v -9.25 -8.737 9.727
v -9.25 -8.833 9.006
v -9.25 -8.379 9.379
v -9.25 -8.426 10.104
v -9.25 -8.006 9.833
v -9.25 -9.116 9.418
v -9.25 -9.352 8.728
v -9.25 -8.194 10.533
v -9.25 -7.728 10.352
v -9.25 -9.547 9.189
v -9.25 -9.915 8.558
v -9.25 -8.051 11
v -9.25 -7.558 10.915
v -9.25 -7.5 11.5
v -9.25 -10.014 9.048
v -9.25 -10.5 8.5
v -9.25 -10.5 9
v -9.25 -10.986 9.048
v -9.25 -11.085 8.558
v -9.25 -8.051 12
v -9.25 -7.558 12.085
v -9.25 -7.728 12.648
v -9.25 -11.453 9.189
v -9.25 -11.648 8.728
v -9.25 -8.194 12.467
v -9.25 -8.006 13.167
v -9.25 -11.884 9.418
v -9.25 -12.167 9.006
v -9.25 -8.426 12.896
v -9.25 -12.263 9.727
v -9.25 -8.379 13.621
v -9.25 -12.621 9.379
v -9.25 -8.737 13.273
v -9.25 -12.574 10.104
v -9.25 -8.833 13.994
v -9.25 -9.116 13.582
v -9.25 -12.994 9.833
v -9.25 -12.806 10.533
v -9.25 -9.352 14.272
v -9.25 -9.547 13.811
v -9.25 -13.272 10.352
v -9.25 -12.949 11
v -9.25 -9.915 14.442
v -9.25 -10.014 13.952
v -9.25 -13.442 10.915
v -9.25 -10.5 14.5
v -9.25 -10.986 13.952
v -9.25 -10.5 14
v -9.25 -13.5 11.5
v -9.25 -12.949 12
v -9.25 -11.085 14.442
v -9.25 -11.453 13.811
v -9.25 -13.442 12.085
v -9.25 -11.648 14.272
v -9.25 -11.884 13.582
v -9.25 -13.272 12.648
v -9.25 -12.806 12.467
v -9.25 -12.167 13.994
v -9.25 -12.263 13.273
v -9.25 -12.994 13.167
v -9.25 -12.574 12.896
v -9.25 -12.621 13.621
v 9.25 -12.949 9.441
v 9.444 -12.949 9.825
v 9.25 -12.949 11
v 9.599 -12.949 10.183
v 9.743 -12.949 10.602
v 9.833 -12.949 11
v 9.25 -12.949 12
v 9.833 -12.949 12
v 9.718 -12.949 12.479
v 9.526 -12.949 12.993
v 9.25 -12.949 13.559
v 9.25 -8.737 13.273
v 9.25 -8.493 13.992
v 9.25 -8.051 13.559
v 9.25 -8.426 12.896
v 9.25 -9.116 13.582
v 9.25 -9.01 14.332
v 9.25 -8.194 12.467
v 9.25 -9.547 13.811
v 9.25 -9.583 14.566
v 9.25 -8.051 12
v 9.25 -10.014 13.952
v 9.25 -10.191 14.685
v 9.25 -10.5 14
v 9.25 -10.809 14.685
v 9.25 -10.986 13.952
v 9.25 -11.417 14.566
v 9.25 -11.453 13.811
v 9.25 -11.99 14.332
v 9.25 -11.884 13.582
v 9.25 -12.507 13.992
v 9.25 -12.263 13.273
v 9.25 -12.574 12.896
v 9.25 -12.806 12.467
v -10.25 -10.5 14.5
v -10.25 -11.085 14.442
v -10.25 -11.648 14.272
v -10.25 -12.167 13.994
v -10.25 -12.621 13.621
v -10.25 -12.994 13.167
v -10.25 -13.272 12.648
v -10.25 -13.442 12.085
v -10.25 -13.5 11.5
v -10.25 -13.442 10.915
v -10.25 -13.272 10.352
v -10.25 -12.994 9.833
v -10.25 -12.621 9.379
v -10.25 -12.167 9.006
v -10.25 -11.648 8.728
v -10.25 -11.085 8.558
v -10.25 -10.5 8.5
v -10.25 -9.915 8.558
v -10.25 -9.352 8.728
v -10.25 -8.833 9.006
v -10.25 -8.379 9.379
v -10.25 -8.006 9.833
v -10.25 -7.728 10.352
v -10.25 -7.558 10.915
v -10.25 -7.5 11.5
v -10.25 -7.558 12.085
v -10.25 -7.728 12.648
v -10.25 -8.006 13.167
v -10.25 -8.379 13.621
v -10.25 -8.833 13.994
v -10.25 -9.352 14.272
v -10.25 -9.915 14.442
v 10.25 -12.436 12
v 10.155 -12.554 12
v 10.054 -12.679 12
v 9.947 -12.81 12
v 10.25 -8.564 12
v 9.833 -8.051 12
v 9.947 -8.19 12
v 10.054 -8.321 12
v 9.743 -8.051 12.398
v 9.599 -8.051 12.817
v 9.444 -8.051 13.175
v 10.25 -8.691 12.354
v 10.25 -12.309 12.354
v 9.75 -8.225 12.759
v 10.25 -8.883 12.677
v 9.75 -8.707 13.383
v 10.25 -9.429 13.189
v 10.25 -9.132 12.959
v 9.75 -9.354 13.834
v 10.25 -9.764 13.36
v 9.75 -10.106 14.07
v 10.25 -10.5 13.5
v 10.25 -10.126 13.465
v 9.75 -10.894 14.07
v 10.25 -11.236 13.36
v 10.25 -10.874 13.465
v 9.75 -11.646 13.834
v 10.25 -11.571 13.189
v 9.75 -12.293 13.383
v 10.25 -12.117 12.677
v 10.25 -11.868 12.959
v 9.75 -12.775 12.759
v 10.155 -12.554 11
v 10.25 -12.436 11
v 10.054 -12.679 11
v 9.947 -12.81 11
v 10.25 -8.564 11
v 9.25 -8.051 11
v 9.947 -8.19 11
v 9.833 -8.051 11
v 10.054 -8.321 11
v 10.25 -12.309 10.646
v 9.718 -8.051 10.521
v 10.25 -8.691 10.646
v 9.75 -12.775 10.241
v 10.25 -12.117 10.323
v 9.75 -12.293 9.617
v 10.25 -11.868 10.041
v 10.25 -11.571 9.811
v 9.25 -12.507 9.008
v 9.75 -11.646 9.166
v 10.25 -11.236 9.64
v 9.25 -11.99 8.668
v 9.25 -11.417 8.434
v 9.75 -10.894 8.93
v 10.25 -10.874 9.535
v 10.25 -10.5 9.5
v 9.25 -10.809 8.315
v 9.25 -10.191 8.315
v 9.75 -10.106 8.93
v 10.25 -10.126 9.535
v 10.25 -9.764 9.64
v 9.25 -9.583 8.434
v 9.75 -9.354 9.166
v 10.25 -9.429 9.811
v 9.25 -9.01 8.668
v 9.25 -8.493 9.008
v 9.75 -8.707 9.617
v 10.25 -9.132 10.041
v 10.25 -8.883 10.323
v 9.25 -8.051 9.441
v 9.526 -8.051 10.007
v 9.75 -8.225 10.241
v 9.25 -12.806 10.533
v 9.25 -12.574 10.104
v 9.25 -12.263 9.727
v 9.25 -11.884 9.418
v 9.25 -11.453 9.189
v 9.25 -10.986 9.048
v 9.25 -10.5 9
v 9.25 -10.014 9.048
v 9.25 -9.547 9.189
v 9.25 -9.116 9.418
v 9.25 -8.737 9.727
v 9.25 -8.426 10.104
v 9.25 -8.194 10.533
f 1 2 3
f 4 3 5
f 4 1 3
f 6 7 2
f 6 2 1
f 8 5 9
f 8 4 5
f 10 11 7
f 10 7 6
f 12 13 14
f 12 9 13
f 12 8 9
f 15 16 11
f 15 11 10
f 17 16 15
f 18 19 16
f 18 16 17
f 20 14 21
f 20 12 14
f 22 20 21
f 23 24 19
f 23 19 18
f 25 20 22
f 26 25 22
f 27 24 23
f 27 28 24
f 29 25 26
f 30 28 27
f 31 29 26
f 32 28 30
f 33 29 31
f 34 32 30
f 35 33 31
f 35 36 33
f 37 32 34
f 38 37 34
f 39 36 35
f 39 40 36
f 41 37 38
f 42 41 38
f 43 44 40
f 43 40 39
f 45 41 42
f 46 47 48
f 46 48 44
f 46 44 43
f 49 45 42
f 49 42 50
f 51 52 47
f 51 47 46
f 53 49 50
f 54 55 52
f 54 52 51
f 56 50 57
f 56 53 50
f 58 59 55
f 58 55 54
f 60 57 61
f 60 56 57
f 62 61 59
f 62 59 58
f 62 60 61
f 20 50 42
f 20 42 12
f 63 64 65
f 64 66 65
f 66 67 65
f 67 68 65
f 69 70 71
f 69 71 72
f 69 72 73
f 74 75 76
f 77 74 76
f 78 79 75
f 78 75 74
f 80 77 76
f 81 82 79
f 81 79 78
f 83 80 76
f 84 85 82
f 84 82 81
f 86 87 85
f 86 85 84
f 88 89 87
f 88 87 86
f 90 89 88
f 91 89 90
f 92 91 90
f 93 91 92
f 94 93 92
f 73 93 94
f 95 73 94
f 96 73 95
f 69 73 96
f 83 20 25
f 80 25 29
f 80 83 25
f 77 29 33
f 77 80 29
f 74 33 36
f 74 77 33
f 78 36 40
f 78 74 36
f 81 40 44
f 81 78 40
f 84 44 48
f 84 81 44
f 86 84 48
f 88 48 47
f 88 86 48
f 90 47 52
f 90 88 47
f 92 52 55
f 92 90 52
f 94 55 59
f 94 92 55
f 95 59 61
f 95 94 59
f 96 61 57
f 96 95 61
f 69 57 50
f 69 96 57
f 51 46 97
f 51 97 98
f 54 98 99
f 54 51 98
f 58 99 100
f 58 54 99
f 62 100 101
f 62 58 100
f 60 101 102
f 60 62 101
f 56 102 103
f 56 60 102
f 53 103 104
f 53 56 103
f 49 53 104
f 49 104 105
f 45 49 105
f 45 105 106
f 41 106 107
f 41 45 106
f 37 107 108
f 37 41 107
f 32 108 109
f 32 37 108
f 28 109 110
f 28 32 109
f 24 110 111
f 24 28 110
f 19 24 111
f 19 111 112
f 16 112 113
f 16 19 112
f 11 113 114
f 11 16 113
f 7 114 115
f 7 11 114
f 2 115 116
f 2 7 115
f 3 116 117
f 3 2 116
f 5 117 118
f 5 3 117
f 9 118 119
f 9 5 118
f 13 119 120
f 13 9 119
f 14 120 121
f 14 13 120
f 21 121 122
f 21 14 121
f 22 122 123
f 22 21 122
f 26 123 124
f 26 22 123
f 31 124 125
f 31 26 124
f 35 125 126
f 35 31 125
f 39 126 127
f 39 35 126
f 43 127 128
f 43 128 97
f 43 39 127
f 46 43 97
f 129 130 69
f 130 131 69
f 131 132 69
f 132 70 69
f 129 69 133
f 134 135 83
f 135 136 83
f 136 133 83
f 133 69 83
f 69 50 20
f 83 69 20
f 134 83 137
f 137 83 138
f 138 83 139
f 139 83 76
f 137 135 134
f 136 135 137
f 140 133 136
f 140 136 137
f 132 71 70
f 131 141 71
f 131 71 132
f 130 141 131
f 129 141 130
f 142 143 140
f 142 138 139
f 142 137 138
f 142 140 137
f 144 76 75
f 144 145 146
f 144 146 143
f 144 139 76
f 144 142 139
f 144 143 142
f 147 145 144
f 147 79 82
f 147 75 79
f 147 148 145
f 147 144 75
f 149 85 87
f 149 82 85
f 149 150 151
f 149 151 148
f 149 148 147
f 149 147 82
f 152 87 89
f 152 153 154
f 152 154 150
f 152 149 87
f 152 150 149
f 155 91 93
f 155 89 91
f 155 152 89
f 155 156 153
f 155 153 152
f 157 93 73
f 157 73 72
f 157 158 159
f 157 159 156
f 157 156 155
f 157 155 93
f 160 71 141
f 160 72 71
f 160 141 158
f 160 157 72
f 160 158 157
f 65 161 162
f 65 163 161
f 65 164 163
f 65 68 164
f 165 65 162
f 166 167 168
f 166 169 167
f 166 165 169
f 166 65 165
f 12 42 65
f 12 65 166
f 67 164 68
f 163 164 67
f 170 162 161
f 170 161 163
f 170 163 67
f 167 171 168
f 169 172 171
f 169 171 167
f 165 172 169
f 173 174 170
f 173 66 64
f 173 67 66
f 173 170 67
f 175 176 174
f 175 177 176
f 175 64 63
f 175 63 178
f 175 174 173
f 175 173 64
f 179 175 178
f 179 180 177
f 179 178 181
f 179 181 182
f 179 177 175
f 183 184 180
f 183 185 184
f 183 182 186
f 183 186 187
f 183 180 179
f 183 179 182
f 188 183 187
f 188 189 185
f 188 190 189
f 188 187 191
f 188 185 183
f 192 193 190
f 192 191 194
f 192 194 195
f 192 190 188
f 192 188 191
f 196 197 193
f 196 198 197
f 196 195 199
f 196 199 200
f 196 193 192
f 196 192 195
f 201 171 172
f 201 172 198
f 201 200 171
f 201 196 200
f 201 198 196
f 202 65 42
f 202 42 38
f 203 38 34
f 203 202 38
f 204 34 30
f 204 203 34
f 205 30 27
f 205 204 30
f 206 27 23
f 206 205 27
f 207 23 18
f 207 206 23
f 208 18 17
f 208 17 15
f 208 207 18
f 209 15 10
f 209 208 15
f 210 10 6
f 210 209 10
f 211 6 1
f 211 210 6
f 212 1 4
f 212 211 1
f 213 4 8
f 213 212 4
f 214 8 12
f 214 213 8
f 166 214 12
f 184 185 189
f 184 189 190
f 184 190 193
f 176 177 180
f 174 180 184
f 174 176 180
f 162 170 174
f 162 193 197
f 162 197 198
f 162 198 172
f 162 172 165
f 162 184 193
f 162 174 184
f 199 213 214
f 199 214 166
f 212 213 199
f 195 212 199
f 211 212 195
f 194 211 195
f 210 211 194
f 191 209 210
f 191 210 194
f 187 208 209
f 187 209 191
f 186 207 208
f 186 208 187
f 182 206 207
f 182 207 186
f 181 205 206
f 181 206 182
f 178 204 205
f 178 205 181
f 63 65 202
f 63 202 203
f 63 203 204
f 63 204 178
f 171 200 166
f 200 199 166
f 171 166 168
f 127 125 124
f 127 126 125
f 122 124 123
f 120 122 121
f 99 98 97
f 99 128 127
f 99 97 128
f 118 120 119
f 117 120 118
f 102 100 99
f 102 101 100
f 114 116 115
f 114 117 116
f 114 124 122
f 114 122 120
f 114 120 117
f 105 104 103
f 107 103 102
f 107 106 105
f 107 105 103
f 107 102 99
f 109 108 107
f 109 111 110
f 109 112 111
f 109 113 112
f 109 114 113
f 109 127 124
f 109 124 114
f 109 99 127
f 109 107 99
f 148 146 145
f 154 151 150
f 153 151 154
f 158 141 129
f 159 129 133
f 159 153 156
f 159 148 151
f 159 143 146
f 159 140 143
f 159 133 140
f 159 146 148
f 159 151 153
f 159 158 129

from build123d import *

# Parameters (mm, degrees)
SKETCH009_W     = 7.72
SKETCH009_H     = 1
POCKET001_DEPTH = 26
POCKET002_DEPTH = 25


with BuildPart() as part:
    # Sketch008 → Revolution (revolve)
    with BuildSketch(Plane.XZ):
        Polygon((-1, 0), (-1, 3), (0, 3), (0, 2.5), (18.5, 2.5), (18.5, 3.2), (19.5, 2), (19.5, 0), align=None)
    revolve(axis=Axis((0, 0, 0), (1, 0, 0)))

    # Sketch009 → Pocket001 (cut)
    with BuildSketch(Plane.YZ):
        Rectangle(SKETCH009_W, SKETCH009_H)
    extrude(amount=POCKET001_DEPTH, mode=Mode.SUBTRACT)

    # Sketch010 → Pocket002 (cut, symmetric)
    with BuildSketch(Plane.XY):
        Polygon((15.1, 2.44949), (23.12, 2.44949), (23.12, -2.44949), (15.1, -2.44949), (15.1, -3.86051), (30.32, -3.86051), (30.32, 7.01949), (15.1, 7.01949), align=None)
    extrude(amount=POCKET002_DEPTH, both=True, mode=Mode.SUBTRACT)


with BuildPart() as part_1:
    # Body002 placement: moved
    add(part.part.moved(Location((-9.25, -10.5, 11.5))))


solid = part_1.part
